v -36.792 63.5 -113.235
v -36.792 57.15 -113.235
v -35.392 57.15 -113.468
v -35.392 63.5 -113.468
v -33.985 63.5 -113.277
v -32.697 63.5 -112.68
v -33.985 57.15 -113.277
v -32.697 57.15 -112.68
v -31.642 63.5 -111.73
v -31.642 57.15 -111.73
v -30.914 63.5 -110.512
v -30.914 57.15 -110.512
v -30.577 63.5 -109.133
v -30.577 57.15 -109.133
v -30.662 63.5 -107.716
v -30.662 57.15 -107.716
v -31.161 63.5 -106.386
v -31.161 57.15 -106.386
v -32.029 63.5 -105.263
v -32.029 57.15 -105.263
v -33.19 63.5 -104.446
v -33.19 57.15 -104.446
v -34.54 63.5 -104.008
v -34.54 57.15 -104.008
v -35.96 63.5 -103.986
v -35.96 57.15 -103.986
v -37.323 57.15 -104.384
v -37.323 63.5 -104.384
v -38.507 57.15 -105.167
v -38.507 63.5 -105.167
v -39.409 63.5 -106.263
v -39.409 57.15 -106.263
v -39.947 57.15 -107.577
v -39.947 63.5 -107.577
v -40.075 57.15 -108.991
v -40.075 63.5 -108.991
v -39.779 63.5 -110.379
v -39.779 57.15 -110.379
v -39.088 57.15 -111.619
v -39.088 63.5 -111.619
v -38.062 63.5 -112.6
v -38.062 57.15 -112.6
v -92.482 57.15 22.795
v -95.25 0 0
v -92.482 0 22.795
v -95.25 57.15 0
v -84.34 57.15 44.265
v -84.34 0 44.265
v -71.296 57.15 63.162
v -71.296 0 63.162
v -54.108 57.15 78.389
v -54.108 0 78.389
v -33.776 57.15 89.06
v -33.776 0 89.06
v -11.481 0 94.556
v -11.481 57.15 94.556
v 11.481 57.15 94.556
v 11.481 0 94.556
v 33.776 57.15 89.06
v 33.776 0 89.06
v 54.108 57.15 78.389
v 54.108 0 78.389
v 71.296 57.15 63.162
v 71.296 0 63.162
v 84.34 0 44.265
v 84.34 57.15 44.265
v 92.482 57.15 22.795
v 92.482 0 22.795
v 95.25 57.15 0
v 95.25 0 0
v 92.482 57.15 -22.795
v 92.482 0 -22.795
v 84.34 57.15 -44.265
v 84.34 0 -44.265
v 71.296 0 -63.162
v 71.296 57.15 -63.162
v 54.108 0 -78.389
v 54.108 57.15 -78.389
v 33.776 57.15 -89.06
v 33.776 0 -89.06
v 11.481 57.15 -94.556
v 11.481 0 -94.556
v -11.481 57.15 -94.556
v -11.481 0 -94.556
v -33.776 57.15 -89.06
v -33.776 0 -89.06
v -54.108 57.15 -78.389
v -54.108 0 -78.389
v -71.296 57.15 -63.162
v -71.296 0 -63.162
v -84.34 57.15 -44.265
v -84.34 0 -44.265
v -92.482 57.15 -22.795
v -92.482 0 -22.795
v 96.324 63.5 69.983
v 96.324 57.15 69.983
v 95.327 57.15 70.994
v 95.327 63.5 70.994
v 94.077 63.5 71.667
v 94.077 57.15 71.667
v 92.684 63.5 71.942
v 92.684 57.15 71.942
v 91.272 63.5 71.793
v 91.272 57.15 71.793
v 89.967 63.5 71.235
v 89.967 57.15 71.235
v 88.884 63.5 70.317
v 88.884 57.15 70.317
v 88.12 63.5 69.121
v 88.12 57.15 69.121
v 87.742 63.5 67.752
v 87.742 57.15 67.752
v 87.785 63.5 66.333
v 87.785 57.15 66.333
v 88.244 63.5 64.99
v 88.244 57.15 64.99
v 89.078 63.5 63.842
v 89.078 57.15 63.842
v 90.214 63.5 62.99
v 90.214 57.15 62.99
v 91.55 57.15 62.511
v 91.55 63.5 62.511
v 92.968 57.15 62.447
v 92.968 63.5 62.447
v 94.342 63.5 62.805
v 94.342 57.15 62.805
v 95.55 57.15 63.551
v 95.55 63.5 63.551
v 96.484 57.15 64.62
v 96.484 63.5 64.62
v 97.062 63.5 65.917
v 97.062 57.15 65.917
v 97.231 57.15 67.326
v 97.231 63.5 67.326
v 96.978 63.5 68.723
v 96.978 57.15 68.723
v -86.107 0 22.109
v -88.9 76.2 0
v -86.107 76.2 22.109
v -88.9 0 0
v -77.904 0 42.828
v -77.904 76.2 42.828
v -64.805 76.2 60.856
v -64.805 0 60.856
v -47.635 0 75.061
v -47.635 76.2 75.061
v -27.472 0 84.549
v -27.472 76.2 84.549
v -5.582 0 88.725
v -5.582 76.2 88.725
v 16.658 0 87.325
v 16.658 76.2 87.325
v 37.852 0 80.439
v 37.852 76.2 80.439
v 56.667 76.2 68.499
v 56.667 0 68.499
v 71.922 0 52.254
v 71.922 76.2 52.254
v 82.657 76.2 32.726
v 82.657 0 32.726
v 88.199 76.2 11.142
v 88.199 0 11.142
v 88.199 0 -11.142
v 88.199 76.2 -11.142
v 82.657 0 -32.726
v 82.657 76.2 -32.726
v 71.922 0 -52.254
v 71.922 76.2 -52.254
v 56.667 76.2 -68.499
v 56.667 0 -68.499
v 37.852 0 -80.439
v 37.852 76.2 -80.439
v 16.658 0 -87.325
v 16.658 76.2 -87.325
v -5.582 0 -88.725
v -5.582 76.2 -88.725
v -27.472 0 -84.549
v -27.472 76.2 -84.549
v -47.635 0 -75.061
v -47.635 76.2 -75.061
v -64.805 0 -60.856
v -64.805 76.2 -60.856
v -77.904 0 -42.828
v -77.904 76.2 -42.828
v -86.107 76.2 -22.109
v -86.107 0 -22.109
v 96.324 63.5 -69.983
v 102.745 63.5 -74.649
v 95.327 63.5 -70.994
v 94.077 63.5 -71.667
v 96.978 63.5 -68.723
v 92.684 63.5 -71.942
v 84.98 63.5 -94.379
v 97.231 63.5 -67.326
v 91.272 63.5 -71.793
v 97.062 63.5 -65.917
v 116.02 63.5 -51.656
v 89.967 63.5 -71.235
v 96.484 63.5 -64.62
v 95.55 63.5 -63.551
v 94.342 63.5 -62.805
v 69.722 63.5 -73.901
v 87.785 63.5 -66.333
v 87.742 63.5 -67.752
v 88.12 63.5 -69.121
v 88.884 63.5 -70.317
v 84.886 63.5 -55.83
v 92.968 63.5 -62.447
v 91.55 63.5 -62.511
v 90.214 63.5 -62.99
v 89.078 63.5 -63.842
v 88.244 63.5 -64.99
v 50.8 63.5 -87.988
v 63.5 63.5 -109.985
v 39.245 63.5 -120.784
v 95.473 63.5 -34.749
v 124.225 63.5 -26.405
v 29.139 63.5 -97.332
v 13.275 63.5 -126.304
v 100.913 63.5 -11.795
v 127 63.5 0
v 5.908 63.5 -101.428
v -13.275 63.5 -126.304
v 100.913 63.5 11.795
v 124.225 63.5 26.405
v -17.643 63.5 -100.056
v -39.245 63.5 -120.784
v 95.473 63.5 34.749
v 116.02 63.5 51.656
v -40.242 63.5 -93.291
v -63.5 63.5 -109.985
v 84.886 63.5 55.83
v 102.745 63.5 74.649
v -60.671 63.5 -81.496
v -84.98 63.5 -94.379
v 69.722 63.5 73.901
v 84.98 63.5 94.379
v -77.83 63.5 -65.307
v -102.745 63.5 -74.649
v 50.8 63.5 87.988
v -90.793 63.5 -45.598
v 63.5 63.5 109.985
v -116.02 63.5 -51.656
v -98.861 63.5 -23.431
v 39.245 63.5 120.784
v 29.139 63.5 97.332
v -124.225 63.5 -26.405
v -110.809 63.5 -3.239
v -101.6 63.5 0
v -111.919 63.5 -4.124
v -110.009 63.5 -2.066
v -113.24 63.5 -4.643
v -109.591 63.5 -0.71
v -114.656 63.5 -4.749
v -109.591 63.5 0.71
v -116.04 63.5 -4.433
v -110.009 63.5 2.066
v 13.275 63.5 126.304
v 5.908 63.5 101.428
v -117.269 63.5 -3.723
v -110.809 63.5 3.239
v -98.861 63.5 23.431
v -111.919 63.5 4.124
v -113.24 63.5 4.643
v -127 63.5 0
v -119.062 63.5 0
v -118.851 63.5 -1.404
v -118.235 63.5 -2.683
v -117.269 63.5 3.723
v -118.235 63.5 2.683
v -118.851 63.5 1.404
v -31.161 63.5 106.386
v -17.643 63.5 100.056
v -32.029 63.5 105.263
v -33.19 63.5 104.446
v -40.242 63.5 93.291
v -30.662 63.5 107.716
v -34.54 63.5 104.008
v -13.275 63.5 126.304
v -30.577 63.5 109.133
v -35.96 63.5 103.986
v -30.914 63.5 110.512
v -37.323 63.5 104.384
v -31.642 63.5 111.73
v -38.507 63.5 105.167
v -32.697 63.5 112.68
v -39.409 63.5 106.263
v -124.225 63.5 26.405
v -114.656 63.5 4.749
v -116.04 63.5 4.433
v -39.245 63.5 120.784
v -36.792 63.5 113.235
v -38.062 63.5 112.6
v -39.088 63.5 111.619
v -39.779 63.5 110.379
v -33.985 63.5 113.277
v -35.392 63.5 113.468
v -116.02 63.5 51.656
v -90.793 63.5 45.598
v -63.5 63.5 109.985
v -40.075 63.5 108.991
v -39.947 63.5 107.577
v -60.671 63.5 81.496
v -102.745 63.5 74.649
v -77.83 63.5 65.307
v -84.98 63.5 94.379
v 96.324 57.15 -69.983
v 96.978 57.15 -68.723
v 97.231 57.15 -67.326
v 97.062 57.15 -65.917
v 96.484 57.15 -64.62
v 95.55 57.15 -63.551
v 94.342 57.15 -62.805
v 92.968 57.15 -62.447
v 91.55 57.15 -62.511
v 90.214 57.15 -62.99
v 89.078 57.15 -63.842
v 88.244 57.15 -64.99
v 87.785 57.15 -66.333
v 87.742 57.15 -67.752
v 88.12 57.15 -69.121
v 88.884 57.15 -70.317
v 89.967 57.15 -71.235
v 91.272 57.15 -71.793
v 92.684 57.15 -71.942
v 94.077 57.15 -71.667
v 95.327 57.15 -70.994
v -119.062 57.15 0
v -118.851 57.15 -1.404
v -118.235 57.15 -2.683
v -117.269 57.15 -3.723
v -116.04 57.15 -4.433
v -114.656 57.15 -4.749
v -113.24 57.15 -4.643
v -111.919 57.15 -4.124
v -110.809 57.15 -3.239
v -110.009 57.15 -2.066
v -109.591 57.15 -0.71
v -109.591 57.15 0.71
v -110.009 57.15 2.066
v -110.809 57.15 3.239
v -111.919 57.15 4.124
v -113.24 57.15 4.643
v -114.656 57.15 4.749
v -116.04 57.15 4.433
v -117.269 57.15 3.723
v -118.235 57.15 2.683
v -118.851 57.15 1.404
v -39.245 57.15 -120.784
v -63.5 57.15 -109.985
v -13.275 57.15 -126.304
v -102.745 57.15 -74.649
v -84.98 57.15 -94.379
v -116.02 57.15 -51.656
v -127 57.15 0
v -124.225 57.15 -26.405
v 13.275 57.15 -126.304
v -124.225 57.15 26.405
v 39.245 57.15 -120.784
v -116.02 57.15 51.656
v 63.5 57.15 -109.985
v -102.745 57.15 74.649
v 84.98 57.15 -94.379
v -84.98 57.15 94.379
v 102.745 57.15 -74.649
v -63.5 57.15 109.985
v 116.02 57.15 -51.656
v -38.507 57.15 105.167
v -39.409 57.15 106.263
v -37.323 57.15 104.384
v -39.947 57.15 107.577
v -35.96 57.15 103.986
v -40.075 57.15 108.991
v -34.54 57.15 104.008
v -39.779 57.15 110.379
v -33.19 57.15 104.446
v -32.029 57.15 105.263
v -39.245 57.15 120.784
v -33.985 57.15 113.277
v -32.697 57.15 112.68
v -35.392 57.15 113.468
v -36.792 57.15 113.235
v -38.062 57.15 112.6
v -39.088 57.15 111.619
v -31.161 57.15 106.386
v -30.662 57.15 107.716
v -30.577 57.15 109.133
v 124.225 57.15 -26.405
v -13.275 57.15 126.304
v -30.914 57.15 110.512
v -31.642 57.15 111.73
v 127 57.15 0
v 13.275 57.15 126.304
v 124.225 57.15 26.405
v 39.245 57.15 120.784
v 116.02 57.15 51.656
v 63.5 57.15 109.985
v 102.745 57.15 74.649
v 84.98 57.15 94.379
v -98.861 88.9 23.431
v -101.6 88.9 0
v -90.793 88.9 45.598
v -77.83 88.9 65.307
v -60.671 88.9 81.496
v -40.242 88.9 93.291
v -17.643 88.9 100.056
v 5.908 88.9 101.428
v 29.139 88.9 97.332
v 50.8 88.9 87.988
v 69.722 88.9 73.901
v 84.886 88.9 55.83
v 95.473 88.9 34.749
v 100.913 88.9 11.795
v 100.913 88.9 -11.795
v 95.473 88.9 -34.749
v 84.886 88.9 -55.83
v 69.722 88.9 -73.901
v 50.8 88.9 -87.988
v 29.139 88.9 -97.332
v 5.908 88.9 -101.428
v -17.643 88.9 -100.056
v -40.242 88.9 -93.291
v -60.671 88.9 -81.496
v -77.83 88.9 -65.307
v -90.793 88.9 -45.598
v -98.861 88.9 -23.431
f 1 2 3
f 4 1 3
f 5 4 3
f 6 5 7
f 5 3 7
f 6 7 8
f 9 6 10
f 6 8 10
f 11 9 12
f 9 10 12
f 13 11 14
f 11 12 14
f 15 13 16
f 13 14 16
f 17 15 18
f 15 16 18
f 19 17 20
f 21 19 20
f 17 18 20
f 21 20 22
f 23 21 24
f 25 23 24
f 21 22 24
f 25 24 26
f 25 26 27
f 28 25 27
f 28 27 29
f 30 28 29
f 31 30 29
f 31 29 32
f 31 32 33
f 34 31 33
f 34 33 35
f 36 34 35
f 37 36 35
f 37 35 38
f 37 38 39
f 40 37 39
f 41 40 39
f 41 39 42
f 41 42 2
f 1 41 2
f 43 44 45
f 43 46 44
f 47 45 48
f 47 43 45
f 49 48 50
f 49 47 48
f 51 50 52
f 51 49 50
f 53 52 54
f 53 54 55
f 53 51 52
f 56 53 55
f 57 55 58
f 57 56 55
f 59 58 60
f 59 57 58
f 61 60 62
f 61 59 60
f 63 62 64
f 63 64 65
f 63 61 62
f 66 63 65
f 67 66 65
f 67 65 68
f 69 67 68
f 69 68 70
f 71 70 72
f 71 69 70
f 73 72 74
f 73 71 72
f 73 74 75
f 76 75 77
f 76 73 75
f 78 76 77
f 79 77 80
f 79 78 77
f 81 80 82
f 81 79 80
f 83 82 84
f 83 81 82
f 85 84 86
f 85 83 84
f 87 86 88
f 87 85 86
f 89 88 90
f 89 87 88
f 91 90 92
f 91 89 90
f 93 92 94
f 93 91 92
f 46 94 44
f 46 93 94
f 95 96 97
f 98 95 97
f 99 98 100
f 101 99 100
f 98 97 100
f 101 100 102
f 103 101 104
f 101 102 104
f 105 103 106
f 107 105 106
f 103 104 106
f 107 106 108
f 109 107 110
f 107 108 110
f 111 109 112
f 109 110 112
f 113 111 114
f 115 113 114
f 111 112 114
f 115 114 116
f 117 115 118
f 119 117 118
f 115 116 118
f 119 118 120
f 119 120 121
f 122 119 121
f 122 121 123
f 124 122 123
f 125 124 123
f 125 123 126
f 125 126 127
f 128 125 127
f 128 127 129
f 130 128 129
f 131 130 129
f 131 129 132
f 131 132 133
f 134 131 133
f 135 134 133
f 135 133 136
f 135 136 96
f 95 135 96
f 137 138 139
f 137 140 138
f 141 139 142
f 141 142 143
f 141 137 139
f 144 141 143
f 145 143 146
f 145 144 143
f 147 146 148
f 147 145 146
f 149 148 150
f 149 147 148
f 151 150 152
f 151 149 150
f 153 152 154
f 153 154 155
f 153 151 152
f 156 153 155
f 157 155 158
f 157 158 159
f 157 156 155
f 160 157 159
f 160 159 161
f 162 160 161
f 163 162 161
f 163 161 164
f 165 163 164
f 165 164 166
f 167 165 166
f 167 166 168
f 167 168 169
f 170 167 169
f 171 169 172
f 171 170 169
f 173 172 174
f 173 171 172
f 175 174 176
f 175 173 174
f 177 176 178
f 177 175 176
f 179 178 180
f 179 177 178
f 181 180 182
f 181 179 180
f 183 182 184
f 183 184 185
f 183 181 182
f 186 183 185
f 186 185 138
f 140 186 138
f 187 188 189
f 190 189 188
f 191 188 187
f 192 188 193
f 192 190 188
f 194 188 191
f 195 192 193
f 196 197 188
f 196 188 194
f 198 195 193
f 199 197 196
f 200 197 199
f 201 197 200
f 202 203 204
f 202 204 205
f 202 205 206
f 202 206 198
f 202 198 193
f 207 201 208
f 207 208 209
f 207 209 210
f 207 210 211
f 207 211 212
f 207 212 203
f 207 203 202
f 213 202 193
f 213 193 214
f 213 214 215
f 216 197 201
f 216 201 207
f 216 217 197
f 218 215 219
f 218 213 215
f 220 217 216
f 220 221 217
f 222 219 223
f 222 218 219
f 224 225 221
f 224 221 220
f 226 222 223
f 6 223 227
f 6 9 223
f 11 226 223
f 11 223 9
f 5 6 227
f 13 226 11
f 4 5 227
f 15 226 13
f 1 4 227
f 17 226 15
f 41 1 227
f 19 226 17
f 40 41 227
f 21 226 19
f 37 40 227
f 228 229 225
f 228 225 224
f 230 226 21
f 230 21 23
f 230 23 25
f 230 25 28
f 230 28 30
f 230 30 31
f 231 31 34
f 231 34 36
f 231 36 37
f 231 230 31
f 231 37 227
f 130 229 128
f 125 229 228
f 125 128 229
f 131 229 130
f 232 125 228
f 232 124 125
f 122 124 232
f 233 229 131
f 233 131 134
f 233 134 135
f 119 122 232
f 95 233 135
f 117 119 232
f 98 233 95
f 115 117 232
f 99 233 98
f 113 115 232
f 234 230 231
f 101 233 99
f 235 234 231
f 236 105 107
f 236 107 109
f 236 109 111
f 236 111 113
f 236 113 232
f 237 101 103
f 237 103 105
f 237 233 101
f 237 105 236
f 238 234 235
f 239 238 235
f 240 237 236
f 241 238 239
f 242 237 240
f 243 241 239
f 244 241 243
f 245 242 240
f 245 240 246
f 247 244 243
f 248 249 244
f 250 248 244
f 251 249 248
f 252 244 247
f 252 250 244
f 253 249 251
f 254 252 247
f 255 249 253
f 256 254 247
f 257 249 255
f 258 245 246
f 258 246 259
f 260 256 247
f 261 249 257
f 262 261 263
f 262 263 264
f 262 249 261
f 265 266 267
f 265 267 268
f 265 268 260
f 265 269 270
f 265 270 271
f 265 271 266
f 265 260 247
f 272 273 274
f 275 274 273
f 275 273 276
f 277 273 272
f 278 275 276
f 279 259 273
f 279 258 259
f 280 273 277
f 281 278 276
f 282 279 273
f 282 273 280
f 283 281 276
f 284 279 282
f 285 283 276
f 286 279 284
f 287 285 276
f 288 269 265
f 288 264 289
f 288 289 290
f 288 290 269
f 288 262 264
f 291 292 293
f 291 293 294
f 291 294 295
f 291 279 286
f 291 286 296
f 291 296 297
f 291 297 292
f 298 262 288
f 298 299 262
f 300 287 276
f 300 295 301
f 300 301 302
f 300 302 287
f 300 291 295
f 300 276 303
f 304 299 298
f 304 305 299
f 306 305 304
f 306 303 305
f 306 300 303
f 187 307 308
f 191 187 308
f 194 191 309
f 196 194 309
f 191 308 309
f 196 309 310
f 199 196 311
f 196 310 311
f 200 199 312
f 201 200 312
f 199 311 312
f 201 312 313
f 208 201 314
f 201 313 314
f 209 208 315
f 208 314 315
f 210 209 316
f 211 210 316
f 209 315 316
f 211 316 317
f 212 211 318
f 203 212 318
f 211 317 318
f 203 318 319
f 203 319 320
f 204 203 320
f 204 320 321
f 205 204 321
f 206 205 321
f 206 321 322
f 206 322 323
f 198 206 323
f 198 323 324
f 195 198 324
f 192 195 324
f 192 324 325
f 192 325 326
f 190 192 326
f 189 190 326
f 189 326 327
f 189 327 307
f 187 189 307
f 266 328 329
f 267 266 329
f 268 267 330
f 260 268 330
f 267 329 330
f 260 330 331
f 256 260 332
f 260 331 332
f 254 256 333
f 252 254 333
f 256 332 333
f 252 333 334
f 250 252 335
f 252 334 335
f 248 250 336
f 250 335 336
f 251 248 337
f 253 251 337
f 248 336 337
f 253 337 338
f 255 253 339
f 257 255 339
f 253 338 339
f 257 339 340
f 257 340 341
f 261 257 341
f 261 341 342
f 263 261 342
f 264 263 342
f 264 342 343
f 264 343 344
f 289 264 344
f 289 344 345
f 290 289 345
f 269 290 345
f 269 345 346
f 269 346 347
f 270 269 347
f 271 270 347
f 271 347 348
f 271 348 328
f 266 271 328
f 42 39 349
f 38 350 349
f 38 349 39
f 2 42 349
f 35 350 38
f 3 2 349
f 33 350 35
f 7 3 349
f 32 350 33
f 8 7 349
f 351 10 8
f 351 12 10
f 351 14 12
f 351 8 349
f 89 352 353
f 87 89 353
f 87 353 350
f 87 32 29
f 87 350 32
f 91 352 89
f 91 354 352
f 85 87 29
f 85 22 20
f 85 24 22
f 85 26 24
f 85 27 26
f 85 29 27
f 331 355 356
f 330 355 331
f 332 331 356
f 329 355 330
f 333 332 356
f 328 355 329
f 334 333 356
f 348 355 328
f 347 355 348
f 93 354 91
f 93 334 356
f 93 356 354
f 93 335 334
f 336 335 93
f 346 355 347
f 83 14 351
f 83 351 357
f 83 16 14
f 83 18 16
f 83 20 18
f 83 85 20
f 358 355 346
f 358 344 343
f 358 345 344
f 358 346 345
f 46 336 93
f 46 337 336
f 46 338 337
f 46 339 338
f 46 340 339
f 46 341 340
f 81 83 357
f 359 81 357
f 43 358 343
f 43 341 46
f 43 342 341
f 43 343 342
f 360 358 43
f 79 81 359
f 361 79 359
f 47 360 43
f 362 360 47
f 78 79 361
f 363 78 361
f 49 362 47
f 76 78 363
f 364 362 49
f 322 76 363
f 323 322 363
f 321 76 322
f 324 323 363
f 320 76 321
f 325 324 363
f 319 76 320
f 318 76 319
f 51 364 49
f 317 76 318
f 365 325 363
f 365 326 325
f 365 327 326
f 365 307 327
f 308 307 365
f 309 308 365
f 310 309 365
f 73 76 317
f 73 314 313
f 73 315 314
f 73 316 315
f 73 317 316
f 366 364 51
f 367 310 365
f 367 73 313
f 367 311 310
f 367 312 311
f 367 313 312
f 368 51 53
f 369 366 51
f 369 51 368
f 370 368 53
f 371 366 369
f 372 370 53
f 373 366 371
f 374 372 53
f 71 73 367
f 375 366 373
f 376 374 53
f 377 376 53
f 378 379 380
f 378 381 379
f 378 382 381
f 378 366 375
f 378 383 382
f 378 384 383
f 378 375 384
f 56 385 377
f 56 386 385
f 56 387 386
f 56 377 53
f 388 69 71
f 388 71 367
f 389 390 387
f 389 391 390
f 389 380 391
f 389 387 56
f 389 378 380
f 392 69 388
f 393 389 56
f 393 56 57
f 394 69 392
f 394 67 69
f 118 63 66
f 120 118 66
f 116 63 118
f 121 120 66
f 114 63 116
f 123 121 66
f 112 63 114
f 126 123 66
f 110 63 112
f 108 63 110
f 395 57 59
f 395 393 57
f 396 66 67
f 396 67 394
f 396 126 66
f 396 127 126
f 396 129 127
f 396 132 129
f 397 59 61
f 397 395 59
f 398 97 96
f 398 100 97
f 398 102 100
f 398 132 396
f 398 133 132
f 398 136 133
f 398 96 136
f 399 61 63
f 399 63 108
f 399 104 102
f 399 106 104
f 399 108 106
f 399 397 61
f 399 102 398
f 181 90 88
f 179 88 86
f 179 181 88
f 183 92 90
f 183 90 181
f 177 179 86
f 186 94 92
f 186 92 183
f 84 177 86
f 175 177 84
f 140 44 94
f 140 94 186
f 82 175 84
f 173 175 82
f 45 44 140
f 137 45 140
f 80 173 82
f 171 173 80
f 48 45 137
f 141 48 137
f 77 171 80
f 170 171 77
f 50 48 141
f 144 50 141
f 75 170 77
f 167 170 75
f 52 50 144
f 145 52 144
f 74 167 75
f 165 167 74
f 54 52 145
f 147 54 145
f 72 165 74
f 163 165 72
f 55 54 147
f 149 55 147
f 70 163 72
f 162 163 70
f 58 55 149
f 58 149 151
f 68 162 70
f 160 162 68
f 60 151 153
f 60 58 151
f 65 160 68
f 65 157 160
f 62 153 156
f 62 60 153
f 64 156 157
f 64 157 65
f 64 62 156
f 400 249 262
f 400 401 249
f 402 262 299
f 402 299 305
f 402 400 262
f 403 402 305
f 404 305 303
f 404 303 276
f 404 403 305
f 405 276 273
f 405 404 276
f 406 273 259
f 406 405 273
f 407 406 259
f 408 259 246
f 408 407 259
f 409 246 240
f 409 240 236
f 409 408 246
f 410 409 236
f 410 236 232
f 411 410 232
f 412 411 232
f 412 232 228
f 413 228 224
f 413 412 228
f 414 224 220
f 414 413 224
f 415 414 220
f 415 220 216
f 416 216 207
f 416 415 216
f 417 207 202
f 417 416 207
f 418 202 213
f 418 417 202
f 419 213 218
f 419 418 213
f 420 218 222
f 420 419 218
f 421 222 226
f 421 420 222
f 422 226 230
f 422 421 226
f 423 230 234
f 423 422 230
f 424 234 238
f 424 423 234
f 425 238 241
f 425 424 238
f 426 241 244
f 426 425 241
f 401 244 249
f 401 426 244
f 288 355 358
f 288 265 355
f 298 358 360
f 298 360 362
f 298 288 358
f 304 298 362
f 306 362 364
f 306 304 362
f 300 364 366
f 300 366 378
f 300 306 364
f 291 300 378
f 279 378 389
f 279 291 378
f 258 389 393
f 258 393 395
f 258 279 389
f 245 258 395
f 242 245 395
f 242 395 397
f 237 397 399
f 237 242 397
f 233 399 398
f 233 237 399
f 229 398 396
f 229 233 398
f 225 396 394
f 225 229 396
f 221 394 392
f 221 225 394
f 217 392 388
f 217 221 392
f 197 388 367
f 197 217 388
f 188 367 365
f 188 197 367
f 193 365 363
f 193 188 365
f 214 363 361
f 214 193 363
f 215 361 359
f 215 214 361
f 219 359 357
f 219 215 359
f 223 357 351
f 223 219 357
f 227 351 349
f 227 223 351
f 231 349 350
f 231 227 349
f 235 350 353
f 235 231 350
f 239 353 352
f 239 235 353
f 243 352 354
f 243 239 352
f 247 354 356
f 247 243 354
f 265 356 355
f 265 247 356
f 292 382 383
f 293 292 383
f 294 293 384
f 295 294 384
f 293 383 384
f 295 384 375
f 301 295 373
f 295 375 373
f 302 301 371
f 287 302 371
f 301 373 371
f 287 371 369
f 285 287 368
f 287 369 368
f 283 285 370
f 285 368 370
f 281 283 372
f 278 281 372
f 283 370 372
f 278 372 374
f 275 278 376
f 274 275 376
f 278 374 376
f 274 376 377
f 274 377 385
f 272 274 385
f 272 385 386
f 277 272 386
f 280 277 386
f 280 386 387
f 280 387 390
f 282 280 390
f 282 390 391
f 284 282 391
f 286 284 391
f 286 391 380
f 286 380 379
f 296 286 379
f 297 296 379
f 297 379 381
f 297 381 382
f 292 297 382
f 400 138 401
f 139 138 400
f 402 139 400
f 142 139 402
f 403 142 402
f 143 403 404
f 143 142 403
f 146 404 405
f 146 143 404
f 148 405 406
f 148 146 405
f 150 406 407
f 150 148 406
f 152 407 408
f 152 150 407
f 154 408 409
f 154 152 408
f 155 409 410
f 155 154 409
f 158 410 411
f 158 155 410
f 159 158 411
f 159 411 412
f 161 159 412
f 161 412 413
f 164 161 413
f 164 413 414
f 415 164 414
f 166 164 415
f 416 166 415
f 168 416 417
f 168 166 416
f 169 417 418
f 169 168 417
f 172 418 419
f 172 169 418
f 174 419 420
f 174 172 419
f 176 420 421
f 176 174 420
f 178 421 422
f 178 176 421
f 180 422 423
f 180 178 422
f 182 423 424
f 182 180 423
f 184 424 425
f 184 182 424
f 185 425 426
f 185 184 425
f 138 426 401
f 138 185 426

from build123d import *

# Parameters (mm, degrees)
HOLE1_D           = 9.525
CIRPATTERN1_COUNT = 5


with BuildPart() as part:
    # Sketch2 → Revolve1 (revolve)
    with BuildSketch(Plane.XY):
        Polygon((-88.9, 0), (-95.25, 0), (-95.25, 57.15), (-127, 57.15), (-127, 63.5), (-101.6, 63.5), (-101.6, 88.9), (-88.9, 76.2), align=None)
    revolve(axis=Axis((0, 3.725942355, 0), (0, 1, 0)))

    # Hole1 (through all)
    with Locations(Plane(origin=(0, 63.5, 0), x_dir=(1, 0, 0), z_dir=(0, 1, 0))):
        with Locations((-114.3, 0)):
            hole1 = Hole(HOLE1_D / 2)

    # CirPattern1: Hole1 ×5 about axis
    cirpattern1_axis = Axis((0, 0, 0), (0, 1, 0))
    for i in range(1, CIRPATTERN1_COUNT):
        add(hole1.rotate(cirpattern1_axis, i * 360 / CIRPATTERN1_COUNT), mode=Mode.SUBTRACT)


solid = part.part
